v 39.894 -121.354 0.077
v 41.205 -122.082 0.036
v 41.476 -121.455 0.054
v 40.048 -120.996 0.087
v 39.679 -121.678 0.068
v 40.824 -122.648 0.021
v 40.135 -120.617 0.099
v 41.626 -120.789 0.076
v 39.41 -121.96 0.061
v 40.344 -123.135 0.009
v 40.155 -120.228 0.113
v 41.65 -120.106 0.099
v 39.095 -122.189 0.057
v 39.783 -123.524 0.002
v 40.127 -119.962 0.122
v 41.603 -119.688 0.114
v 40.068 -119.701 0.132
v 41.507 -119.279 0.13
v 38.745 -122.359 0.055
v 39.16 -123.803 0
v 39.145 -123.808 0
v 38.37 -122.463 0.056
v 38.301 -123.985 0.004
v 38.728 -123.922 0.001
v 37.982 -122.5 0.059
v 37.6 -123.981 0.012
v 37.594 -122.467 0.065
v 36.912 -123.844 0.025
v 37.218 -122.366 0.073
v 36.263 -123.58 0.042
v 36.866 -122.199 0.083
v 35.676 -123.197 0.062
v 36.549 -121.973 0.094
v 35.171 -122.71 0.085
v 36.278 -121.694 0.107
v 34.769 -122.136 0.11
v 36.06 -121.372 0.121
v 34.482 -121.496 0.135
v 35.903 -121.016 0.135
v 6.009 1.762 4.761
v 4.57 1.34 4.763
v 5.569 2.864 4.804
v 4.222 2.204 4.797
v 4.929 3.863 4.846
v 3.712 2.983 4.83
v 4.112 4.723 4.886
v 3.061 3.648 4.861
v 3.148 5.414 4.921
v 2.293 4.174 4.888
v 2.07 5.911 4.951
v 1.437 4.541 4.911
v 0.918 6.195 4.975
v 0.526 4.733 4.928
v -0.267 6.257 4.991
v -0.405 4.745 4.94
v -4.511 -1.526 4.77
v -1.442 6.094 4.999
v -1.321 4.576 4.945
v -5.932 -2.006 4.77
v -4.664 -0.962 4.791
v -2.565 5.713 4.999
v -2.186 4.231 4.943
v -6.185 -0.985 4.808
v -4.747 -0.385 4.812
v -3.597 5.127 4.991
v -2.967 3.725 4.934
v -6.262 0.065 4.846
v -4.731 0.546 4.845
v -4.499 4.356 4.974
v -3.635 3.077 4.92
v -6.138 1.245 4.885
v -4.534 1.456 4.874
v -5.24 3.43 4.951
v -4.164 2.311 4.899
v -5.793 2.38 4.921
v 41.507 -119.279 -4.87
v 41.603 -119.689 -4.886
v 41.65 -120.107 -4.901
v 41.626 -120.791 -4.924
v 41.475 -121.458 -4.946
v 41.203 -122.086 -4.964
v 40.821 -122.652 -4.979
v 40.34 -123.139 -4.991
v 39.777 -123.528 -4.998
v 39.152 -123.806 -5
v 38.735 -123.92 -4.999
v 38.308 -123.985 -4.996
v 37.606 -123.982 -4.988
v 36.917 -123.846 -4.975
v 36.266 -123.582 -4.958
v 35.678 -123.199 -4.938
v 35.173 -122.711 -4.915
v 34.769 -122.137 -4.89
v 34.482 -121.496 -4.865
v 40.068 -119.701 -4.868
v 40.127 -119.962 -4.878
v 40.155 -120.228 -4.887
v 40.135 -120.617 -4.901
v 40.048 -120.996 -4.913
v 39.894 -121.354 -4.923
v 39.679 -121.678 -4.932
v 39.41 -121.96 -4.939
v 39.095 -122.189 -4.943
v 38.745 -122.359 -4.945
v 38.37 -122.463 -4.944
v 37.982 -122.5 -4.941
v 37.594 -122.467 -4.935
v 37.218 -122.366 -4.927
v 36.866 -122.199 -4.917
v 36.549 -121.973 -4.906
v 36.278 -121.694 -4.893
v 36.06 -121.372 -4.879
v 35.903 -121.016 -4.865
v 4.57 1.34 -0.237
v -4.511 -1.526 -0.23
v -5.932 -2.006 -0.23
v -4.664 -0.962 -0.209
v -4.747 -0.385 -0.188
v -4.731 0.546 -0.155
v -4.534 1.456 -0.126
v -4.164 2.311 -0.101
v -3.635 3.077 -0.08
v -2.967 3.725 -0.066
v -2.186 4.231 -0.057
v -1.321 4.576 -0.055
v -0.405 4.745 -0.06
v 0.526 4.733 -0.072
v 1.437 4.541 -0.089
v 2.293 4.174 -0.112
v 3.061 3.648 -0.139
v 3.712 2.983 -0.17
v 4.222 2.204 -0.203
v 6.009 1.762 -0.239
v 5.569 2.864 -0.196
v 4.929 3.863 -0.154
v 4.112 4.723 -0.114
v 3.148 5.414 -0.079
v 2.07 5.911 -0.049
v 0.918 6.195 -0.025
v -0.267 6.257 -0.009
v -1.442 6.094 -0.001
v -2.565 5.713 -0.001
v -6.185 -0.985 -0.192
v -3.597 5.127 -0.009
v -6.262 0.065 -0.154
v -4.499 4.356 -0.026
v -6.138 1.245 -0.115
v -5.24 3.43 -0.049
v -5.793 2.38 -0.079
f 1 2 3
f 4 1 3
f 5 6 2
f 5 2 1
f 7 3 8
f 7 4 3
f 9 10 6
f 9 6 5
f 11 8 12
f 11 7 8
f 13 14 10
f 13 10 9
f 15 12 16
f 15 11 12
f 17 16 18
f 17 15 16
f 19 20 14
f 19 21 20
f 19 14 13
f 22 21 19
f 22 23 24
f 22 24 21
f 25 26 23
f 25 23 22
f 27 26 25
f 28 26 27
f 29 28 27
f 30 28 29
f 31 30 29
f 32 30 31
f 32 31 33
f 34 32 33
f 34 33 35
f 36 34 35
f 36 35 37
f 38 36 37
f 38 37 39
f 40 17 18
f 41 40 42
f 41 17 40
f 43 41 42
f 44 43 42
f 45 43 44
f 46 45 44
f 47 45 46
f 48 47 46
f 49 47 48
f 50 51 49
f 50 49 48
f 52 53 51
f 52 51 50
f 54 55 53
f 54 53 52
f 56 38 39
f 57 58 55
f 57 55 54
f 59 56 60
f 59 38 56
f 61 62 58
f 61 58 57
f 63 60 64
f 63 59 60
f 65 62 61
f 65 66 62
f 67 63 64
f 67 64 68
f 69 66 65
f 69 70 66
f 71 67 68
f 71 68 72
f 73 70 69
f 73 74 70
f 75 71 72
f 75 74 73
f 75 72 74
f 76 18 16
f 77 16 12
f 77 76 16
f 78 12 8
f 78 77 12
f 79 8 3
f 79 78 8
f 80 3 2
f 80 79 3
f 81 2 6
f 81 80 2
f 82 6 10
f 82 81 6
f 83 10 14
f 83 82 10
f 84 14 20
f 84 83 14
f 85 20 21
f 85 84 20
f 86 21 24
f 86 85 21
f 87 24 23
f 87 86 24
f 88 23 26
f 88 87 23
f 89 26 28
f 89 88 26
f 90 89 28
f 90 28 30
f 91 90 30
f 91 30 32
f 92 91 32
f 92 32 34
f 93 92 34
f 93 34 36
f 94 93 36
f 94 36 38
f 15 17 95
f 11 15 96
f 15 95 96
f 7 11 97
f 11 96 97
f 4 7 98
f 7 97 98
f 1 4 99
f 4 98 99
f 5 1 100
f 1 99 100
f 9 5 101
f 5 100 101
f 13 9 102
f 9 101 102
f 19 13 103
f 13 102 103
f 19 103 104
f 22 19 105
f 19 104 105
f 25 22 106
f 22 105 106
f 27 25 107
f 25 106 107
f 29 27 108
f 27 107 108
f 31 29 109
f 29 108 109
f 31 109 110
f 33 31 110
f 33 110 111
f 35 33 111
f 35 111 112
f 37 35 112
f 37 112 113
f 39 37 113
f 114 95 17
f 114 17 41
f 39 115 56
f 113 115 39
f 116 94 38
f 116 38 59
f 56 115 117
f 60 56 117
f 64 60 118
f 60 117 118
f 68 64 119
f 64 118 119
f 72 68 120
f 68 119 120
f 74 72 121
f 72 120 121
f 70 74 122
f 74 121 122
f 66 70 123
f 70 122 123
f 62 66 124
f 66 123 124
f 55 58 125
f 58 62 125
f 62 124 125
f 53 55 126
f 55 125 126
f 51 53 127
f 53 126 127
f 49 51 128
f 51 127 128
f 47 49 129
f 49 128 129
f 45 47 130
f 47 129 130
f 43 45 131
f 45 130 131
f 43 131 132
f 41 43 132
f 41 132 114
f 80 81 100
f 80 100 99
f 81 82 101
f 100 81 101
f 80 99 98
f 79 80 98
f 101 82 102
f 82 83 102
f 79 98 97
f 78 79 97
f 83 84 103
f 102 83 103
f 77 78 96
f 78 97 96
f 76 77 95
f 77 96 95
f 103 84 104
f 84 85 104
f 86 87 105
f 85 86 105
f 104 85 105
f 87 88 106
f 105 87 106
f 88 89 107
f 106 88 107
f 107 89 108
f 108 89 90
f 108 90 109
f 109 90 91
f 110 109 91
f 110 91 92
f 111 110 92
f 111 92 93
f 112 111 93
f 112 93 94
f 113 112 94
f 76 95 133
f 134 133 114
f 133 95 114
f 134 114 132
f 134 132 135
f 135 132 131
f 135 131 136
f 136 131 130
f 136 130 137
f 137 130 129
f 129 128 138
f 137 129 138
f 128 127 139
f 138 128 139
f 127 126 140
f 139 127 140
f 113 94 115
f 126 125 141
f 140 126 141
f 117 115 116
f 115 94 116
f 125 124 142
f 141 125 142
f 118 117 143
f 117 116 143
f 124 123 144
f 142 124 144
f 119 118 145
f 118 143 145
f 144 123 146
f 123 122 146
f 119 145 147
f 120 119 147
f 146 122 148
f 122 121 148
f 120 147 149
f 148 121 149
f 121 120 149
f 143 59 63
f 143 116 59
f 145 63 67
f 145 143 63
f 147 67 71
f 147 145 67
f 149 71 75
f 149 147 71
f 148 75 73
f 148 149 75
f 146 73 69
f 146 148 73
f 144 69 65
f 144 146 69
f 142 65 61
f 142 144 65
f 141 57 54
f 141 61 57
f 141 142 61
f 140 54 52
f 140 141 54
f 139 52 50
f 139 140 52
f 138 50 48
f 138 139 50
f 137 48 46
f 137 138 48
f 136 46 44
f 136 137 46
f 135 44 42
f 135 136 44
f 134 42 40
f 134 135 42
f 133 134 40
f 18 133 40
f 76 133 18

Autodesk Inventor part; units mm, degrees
ref_plane "YZ Plane" through (0, 0, 0) normal (1, 0, 0) x (0, 1, 0)
ref_plane "XZ Plane" through (0, 0, 0) normal (0, 1, 0) x (-1, 0, 0)
ref_plane "XY Plane" through (0, 0, 0) normal (0, 0, 1) x (1, 0, 0)
sketch "Sketch1" plane through (0, 0, 0) normal (0, 0, 1) x (1, 0, 0)
  circle A0 centre (0, 0) radius 4.7625 construction
  circle A1 centre (37.9719, -120.3156) radius 2.1844 construction
  arc A2 (35.9027, -121.0155) -> (40.068, -119.7009) centre (37.9719, -120.3156) ccw
  arc A3 (4.57, 1.3403) -> (-4.5114, -1.5259) centre (0, 0) ccw
  line L0 (-4.5114, -1.5259) -> (35.9027, -121.0155)
  line L1 (40.068, -119.7009) -> (4.57, 1.3403)
  line L2 (34.4817, -121.4961) -> (-5.9324, -2.0065)
  arc A4 (6.0094, 1.7624) -> (-5.9324, -2.0065) centre (0, 0) ccw
  line L3 (6.0094, 1.7624) -> (41.5074, -119.2787)
  arc A5 (34.4817, -121.4961) -> (41.5074, -119.2787) centre (37.9719, -120.3156) ccw
  point P0 (0, 0)
  dimension "d0" = 4.3688
  dimension "d1" = 1.5
extrude "Extrusion1" add sketch "Sketch1" along normal blind 5 and the other way blind 5
sketch "Sketch2" plane through (34.4817, -121.4961, -5) normal (-0.9473, -0.3204, 0) x (0, 0, 1)
  line L0 (0, 132.4016) -> (10, 132.4016) projected
  line L1 (10, 126.1391) -> (10, 0) projected
  line L2 (0, 0) -> (0, 126.1391) projected
  line L3 (0, -3.6844) -> (10, -3.6844) projected
  line L4 (0, 0) -> (0, -3.6844) projected
  line L5 (0, 0) -> (0, -3.6844)
  line L6 (10, -3.6844) -> (10, 0) projected
  line L7 (10, -3.6844) -> (10, 0)
  line L8 (10, 132.4016) -> (10, 126.1391)
  line L9 (10, 125.8832) -> (10, 132.4016) projected
  line L10 (0, 132.4016) -> (0, 126.1391)
  line L11 (0, 132.4016) -> (0, 125.8832) projected
  line L12 (5, -3.6844) -> (10, 132.4016)
  line L13 (0, -3.6844) -> (5, 132.4016)
  point P0 (5, 126.1391)
  point P1 (0, -0.1505)
  point P2 (10, -0.1505)
  dimension "d6" = 5
  dimension "d7" = 5
extrude "Extrusion2" cut sketch "Sketch2" against normal blind 25.4 contours L0 L13 L4 L2 L10 | L8 L1 L6 L3 L12
properties part number "Angle Changer right band"
